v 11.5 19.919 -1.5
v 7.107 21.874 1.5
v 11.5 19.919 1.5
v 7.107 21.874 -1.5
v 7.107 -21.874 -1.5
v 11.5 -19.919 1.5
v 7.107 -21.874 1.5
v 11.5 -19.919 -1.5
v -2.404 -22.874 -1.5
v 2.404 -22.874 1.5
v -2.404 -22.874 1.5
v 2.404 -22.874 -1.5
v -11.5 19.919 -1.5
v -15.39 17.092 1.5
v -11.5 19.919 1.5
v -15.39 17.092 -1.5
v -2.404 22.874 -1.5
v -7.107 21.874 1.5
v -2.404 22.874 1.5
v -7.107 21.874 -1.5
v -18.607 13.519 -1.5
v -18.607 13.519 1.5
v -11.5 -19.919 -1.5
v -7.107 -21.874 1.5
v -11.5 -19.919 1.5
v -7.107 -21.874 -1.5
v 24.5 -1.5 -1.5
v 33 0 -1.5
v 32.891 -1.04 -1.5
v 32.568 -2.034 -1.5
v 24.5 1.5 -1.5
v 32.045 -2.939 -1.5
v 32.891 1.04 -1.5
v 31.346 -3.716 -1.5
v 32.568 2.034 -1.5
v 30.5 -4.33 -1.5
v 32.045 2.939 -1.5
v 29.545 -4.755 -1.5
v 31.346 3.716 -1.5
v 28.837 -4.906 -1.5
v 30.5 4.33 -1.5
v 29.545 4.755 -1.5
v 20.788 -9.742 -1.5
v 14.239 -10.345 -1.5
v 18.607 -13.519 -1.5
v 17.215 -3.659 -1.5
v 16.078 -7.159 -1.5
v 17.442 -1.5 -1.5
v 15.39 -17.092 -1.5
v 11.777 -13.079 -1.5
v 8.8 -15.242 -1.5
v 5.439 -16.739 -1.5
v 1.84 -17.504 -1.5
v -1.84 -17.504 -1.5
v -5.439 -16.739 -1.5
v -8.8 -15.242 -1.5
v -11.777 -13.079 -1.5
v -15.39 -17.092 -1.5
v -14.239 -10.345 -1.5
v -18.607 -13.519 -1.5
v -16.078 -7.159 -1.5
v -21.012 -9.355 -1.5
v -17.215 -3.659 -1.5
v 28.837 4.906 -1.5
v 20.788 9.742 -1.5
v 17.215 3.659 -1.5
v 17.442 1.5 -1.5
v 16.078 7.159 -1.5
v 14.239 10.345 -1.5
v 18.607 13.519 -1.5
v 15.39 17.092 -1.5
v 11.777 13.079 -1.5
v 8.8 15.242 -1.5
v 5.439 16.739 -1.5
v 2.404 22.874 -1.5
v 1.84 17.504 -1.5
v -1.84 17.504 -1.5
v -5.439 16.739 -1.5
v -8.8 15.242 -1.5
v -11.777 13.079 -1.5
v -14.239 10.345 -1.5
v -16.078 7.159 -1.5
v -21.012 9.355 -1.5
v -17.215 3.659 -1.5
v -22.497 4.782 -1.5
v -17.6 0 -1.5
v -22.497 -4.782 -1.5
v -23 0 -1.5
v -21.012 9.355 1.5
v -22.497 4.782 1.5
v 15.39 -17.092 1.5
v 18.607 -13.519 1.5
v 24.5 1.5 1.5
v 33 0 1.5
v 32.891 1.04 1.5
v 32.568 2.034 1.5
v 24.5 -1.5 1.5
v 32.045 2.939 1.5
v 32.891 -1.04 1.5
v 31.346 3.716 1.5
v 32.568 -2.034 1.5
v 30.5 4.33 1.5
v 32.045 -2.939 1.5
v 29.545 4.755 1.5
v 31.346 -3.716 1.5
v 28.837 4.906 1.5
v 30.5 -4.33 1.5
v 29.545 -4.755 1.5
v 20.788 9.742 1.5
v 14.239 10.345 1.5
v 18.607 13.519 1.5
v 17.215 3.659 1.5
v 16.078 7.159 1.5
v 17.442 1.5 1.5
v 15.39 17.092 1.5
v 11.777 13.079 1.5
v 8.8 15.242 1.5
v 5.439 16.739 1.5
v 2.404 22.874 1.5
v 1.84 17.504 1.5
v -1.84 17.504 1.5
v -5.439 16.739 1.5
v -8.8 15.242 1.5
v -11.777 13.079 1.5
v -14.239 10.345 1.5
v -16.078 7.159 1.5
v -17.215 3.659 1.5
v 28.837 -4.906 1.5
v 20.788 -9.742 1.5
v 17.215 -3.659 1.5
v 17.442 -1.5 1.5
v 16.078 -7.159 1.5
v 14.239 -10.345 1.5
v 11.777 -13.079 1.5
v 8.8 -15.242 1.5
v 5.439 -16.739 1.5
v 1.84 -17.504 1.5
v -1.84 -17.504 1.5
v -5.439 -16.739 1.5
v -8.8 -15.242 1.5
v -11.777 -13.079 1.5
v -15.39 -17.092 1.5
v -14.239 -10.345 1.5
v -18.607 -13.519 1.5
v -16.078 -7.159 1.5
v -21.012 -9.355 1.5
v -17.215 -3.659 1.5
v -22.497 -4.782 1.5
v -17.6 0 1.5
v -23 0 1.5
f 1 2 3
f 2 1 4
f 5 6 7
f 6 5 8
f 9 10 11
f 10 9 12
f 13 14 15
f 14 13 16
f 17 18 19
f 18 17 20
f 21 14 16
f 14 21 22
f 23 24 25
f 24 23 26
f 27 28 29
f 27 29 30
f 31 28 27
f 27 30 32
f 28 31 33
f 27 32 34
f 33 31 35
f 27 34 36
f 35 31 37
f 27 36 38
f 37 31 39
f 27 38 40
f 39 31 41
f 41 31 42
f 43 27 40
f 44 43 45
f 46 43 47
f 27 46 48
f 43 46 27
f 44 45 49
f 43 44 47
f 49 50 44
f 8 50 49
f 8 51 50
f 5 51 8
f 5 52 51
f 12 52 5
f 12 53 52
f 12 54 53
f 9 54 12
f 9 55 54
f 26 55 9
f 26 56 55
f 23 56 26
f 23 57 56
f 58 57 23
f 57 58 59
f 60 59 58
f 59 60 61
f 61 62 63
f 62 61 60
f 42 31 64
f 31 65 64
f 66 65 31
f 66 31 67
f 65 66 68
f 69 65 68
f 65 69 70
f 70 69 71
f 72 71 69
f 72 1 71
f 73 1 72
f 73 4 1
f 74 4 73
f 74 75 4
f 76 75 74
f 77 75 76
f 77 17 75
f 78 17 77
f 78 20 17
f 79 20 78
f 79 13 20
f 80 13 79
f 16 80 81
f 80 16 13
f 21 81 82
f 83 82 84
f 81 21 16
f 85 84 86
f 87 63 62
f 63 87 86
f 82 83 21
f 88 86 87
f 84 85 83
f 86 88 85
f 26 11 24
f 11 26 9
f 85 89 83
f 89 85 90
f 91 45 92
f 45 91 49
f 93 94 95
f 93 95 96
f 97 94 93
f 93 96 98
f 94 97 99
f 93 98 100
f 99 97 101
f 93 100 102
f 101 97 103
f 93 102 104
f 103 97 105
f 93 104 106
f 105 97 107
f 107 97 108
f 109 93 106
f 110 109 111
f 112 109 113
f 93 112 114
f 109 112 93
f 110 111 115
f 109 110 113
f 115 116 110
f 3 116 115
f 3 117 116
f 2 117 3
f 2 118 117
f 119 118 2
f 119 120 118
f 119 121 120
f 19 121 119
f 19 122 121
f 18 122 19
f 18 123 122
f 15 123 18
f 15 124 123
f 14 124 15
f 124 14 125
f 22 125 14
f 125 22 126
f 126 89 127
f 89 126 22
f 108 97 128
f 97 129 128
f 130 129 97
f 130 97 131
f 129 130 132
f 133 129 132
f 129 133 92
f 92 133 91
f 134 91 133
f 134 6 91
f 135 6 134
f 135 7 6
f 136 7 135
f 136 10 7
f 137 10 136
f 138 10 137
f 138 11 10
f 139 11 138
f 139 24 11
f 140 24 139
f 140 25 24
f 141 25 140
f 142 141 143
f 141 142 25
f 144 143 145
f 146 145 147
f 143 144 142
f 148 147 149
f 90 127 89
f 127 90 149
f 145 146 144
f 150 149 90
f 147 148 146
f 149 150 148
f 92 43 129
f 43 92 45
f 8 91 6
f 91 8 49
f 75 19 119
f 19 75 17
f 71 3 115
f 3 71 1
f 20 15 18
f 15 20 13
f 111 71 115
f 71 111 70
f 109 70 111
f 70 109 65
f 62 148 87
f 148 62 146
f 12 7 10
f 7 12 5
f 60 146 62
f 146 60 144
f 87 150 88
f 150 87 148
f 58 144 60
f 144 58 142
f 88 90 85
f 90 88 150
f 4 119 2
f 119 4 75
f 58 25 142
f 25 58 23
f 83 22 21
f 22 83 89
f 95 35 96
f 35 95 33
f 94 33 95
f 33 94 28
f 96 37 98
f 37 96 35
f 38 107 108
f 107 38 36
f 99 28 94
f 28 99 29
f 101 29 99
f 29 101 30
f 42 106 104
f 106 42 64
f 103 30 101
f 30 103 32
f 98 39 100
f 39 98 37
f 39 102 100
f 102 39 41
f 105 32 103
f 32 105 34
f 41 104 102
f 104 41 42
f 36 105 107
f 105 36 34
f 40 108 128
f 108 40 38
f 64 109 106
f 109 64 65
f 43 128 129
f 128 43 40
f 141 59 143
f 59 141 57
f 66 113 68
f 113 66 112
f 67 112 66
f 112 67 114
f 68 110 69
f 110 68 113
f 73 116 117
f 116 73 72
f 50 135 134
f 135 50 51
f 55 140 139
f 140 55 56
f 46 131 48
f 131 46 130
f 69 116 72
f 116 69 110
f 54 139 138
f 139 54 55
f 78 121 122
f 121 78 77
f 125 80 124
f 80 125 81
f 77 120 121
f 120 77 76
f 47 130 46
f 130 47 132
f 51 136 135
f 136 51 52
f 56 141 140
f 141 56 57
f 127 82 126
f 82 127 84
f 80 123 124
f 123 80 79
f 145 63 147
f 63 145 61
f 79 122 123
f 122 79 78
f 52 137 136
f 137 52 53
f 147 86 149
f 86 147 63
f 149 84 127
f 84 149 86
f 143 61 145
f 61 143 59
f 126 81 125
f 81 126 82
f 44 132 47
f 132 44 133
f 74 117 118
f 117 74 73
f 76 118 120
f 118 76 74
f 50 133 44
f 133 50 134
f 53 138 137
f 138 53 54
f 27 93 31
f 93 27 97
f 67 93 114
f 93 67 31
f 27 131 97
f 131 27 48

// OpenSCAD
$fs=0.01;

difference() {
	union() {
		cylinder(h=3,r=23,center=true);
		translate([10,-5,-1.5])
			cube(size=[15,10,3]);
		translate([28,0,0])
			cylinder(h=3,r=5,center=true);
		translate([19,7.9,0])
			rotate(a=[0,0,59])
				cube(size=[5,20,3],center=true);
		translate([19,-7.9,0])
			rotate(a=[0,0,-59])
				cube(size=[5,20,3],center=true);
	}
	cylinder(h=3,r=17.6,center=true);
	translate([18.1,-1.5,-1.5])
		cube(size=[6.4,3,3]);
	translate([15,-1.5,-1.5])
		cube(size=[4,3,3]);
}
